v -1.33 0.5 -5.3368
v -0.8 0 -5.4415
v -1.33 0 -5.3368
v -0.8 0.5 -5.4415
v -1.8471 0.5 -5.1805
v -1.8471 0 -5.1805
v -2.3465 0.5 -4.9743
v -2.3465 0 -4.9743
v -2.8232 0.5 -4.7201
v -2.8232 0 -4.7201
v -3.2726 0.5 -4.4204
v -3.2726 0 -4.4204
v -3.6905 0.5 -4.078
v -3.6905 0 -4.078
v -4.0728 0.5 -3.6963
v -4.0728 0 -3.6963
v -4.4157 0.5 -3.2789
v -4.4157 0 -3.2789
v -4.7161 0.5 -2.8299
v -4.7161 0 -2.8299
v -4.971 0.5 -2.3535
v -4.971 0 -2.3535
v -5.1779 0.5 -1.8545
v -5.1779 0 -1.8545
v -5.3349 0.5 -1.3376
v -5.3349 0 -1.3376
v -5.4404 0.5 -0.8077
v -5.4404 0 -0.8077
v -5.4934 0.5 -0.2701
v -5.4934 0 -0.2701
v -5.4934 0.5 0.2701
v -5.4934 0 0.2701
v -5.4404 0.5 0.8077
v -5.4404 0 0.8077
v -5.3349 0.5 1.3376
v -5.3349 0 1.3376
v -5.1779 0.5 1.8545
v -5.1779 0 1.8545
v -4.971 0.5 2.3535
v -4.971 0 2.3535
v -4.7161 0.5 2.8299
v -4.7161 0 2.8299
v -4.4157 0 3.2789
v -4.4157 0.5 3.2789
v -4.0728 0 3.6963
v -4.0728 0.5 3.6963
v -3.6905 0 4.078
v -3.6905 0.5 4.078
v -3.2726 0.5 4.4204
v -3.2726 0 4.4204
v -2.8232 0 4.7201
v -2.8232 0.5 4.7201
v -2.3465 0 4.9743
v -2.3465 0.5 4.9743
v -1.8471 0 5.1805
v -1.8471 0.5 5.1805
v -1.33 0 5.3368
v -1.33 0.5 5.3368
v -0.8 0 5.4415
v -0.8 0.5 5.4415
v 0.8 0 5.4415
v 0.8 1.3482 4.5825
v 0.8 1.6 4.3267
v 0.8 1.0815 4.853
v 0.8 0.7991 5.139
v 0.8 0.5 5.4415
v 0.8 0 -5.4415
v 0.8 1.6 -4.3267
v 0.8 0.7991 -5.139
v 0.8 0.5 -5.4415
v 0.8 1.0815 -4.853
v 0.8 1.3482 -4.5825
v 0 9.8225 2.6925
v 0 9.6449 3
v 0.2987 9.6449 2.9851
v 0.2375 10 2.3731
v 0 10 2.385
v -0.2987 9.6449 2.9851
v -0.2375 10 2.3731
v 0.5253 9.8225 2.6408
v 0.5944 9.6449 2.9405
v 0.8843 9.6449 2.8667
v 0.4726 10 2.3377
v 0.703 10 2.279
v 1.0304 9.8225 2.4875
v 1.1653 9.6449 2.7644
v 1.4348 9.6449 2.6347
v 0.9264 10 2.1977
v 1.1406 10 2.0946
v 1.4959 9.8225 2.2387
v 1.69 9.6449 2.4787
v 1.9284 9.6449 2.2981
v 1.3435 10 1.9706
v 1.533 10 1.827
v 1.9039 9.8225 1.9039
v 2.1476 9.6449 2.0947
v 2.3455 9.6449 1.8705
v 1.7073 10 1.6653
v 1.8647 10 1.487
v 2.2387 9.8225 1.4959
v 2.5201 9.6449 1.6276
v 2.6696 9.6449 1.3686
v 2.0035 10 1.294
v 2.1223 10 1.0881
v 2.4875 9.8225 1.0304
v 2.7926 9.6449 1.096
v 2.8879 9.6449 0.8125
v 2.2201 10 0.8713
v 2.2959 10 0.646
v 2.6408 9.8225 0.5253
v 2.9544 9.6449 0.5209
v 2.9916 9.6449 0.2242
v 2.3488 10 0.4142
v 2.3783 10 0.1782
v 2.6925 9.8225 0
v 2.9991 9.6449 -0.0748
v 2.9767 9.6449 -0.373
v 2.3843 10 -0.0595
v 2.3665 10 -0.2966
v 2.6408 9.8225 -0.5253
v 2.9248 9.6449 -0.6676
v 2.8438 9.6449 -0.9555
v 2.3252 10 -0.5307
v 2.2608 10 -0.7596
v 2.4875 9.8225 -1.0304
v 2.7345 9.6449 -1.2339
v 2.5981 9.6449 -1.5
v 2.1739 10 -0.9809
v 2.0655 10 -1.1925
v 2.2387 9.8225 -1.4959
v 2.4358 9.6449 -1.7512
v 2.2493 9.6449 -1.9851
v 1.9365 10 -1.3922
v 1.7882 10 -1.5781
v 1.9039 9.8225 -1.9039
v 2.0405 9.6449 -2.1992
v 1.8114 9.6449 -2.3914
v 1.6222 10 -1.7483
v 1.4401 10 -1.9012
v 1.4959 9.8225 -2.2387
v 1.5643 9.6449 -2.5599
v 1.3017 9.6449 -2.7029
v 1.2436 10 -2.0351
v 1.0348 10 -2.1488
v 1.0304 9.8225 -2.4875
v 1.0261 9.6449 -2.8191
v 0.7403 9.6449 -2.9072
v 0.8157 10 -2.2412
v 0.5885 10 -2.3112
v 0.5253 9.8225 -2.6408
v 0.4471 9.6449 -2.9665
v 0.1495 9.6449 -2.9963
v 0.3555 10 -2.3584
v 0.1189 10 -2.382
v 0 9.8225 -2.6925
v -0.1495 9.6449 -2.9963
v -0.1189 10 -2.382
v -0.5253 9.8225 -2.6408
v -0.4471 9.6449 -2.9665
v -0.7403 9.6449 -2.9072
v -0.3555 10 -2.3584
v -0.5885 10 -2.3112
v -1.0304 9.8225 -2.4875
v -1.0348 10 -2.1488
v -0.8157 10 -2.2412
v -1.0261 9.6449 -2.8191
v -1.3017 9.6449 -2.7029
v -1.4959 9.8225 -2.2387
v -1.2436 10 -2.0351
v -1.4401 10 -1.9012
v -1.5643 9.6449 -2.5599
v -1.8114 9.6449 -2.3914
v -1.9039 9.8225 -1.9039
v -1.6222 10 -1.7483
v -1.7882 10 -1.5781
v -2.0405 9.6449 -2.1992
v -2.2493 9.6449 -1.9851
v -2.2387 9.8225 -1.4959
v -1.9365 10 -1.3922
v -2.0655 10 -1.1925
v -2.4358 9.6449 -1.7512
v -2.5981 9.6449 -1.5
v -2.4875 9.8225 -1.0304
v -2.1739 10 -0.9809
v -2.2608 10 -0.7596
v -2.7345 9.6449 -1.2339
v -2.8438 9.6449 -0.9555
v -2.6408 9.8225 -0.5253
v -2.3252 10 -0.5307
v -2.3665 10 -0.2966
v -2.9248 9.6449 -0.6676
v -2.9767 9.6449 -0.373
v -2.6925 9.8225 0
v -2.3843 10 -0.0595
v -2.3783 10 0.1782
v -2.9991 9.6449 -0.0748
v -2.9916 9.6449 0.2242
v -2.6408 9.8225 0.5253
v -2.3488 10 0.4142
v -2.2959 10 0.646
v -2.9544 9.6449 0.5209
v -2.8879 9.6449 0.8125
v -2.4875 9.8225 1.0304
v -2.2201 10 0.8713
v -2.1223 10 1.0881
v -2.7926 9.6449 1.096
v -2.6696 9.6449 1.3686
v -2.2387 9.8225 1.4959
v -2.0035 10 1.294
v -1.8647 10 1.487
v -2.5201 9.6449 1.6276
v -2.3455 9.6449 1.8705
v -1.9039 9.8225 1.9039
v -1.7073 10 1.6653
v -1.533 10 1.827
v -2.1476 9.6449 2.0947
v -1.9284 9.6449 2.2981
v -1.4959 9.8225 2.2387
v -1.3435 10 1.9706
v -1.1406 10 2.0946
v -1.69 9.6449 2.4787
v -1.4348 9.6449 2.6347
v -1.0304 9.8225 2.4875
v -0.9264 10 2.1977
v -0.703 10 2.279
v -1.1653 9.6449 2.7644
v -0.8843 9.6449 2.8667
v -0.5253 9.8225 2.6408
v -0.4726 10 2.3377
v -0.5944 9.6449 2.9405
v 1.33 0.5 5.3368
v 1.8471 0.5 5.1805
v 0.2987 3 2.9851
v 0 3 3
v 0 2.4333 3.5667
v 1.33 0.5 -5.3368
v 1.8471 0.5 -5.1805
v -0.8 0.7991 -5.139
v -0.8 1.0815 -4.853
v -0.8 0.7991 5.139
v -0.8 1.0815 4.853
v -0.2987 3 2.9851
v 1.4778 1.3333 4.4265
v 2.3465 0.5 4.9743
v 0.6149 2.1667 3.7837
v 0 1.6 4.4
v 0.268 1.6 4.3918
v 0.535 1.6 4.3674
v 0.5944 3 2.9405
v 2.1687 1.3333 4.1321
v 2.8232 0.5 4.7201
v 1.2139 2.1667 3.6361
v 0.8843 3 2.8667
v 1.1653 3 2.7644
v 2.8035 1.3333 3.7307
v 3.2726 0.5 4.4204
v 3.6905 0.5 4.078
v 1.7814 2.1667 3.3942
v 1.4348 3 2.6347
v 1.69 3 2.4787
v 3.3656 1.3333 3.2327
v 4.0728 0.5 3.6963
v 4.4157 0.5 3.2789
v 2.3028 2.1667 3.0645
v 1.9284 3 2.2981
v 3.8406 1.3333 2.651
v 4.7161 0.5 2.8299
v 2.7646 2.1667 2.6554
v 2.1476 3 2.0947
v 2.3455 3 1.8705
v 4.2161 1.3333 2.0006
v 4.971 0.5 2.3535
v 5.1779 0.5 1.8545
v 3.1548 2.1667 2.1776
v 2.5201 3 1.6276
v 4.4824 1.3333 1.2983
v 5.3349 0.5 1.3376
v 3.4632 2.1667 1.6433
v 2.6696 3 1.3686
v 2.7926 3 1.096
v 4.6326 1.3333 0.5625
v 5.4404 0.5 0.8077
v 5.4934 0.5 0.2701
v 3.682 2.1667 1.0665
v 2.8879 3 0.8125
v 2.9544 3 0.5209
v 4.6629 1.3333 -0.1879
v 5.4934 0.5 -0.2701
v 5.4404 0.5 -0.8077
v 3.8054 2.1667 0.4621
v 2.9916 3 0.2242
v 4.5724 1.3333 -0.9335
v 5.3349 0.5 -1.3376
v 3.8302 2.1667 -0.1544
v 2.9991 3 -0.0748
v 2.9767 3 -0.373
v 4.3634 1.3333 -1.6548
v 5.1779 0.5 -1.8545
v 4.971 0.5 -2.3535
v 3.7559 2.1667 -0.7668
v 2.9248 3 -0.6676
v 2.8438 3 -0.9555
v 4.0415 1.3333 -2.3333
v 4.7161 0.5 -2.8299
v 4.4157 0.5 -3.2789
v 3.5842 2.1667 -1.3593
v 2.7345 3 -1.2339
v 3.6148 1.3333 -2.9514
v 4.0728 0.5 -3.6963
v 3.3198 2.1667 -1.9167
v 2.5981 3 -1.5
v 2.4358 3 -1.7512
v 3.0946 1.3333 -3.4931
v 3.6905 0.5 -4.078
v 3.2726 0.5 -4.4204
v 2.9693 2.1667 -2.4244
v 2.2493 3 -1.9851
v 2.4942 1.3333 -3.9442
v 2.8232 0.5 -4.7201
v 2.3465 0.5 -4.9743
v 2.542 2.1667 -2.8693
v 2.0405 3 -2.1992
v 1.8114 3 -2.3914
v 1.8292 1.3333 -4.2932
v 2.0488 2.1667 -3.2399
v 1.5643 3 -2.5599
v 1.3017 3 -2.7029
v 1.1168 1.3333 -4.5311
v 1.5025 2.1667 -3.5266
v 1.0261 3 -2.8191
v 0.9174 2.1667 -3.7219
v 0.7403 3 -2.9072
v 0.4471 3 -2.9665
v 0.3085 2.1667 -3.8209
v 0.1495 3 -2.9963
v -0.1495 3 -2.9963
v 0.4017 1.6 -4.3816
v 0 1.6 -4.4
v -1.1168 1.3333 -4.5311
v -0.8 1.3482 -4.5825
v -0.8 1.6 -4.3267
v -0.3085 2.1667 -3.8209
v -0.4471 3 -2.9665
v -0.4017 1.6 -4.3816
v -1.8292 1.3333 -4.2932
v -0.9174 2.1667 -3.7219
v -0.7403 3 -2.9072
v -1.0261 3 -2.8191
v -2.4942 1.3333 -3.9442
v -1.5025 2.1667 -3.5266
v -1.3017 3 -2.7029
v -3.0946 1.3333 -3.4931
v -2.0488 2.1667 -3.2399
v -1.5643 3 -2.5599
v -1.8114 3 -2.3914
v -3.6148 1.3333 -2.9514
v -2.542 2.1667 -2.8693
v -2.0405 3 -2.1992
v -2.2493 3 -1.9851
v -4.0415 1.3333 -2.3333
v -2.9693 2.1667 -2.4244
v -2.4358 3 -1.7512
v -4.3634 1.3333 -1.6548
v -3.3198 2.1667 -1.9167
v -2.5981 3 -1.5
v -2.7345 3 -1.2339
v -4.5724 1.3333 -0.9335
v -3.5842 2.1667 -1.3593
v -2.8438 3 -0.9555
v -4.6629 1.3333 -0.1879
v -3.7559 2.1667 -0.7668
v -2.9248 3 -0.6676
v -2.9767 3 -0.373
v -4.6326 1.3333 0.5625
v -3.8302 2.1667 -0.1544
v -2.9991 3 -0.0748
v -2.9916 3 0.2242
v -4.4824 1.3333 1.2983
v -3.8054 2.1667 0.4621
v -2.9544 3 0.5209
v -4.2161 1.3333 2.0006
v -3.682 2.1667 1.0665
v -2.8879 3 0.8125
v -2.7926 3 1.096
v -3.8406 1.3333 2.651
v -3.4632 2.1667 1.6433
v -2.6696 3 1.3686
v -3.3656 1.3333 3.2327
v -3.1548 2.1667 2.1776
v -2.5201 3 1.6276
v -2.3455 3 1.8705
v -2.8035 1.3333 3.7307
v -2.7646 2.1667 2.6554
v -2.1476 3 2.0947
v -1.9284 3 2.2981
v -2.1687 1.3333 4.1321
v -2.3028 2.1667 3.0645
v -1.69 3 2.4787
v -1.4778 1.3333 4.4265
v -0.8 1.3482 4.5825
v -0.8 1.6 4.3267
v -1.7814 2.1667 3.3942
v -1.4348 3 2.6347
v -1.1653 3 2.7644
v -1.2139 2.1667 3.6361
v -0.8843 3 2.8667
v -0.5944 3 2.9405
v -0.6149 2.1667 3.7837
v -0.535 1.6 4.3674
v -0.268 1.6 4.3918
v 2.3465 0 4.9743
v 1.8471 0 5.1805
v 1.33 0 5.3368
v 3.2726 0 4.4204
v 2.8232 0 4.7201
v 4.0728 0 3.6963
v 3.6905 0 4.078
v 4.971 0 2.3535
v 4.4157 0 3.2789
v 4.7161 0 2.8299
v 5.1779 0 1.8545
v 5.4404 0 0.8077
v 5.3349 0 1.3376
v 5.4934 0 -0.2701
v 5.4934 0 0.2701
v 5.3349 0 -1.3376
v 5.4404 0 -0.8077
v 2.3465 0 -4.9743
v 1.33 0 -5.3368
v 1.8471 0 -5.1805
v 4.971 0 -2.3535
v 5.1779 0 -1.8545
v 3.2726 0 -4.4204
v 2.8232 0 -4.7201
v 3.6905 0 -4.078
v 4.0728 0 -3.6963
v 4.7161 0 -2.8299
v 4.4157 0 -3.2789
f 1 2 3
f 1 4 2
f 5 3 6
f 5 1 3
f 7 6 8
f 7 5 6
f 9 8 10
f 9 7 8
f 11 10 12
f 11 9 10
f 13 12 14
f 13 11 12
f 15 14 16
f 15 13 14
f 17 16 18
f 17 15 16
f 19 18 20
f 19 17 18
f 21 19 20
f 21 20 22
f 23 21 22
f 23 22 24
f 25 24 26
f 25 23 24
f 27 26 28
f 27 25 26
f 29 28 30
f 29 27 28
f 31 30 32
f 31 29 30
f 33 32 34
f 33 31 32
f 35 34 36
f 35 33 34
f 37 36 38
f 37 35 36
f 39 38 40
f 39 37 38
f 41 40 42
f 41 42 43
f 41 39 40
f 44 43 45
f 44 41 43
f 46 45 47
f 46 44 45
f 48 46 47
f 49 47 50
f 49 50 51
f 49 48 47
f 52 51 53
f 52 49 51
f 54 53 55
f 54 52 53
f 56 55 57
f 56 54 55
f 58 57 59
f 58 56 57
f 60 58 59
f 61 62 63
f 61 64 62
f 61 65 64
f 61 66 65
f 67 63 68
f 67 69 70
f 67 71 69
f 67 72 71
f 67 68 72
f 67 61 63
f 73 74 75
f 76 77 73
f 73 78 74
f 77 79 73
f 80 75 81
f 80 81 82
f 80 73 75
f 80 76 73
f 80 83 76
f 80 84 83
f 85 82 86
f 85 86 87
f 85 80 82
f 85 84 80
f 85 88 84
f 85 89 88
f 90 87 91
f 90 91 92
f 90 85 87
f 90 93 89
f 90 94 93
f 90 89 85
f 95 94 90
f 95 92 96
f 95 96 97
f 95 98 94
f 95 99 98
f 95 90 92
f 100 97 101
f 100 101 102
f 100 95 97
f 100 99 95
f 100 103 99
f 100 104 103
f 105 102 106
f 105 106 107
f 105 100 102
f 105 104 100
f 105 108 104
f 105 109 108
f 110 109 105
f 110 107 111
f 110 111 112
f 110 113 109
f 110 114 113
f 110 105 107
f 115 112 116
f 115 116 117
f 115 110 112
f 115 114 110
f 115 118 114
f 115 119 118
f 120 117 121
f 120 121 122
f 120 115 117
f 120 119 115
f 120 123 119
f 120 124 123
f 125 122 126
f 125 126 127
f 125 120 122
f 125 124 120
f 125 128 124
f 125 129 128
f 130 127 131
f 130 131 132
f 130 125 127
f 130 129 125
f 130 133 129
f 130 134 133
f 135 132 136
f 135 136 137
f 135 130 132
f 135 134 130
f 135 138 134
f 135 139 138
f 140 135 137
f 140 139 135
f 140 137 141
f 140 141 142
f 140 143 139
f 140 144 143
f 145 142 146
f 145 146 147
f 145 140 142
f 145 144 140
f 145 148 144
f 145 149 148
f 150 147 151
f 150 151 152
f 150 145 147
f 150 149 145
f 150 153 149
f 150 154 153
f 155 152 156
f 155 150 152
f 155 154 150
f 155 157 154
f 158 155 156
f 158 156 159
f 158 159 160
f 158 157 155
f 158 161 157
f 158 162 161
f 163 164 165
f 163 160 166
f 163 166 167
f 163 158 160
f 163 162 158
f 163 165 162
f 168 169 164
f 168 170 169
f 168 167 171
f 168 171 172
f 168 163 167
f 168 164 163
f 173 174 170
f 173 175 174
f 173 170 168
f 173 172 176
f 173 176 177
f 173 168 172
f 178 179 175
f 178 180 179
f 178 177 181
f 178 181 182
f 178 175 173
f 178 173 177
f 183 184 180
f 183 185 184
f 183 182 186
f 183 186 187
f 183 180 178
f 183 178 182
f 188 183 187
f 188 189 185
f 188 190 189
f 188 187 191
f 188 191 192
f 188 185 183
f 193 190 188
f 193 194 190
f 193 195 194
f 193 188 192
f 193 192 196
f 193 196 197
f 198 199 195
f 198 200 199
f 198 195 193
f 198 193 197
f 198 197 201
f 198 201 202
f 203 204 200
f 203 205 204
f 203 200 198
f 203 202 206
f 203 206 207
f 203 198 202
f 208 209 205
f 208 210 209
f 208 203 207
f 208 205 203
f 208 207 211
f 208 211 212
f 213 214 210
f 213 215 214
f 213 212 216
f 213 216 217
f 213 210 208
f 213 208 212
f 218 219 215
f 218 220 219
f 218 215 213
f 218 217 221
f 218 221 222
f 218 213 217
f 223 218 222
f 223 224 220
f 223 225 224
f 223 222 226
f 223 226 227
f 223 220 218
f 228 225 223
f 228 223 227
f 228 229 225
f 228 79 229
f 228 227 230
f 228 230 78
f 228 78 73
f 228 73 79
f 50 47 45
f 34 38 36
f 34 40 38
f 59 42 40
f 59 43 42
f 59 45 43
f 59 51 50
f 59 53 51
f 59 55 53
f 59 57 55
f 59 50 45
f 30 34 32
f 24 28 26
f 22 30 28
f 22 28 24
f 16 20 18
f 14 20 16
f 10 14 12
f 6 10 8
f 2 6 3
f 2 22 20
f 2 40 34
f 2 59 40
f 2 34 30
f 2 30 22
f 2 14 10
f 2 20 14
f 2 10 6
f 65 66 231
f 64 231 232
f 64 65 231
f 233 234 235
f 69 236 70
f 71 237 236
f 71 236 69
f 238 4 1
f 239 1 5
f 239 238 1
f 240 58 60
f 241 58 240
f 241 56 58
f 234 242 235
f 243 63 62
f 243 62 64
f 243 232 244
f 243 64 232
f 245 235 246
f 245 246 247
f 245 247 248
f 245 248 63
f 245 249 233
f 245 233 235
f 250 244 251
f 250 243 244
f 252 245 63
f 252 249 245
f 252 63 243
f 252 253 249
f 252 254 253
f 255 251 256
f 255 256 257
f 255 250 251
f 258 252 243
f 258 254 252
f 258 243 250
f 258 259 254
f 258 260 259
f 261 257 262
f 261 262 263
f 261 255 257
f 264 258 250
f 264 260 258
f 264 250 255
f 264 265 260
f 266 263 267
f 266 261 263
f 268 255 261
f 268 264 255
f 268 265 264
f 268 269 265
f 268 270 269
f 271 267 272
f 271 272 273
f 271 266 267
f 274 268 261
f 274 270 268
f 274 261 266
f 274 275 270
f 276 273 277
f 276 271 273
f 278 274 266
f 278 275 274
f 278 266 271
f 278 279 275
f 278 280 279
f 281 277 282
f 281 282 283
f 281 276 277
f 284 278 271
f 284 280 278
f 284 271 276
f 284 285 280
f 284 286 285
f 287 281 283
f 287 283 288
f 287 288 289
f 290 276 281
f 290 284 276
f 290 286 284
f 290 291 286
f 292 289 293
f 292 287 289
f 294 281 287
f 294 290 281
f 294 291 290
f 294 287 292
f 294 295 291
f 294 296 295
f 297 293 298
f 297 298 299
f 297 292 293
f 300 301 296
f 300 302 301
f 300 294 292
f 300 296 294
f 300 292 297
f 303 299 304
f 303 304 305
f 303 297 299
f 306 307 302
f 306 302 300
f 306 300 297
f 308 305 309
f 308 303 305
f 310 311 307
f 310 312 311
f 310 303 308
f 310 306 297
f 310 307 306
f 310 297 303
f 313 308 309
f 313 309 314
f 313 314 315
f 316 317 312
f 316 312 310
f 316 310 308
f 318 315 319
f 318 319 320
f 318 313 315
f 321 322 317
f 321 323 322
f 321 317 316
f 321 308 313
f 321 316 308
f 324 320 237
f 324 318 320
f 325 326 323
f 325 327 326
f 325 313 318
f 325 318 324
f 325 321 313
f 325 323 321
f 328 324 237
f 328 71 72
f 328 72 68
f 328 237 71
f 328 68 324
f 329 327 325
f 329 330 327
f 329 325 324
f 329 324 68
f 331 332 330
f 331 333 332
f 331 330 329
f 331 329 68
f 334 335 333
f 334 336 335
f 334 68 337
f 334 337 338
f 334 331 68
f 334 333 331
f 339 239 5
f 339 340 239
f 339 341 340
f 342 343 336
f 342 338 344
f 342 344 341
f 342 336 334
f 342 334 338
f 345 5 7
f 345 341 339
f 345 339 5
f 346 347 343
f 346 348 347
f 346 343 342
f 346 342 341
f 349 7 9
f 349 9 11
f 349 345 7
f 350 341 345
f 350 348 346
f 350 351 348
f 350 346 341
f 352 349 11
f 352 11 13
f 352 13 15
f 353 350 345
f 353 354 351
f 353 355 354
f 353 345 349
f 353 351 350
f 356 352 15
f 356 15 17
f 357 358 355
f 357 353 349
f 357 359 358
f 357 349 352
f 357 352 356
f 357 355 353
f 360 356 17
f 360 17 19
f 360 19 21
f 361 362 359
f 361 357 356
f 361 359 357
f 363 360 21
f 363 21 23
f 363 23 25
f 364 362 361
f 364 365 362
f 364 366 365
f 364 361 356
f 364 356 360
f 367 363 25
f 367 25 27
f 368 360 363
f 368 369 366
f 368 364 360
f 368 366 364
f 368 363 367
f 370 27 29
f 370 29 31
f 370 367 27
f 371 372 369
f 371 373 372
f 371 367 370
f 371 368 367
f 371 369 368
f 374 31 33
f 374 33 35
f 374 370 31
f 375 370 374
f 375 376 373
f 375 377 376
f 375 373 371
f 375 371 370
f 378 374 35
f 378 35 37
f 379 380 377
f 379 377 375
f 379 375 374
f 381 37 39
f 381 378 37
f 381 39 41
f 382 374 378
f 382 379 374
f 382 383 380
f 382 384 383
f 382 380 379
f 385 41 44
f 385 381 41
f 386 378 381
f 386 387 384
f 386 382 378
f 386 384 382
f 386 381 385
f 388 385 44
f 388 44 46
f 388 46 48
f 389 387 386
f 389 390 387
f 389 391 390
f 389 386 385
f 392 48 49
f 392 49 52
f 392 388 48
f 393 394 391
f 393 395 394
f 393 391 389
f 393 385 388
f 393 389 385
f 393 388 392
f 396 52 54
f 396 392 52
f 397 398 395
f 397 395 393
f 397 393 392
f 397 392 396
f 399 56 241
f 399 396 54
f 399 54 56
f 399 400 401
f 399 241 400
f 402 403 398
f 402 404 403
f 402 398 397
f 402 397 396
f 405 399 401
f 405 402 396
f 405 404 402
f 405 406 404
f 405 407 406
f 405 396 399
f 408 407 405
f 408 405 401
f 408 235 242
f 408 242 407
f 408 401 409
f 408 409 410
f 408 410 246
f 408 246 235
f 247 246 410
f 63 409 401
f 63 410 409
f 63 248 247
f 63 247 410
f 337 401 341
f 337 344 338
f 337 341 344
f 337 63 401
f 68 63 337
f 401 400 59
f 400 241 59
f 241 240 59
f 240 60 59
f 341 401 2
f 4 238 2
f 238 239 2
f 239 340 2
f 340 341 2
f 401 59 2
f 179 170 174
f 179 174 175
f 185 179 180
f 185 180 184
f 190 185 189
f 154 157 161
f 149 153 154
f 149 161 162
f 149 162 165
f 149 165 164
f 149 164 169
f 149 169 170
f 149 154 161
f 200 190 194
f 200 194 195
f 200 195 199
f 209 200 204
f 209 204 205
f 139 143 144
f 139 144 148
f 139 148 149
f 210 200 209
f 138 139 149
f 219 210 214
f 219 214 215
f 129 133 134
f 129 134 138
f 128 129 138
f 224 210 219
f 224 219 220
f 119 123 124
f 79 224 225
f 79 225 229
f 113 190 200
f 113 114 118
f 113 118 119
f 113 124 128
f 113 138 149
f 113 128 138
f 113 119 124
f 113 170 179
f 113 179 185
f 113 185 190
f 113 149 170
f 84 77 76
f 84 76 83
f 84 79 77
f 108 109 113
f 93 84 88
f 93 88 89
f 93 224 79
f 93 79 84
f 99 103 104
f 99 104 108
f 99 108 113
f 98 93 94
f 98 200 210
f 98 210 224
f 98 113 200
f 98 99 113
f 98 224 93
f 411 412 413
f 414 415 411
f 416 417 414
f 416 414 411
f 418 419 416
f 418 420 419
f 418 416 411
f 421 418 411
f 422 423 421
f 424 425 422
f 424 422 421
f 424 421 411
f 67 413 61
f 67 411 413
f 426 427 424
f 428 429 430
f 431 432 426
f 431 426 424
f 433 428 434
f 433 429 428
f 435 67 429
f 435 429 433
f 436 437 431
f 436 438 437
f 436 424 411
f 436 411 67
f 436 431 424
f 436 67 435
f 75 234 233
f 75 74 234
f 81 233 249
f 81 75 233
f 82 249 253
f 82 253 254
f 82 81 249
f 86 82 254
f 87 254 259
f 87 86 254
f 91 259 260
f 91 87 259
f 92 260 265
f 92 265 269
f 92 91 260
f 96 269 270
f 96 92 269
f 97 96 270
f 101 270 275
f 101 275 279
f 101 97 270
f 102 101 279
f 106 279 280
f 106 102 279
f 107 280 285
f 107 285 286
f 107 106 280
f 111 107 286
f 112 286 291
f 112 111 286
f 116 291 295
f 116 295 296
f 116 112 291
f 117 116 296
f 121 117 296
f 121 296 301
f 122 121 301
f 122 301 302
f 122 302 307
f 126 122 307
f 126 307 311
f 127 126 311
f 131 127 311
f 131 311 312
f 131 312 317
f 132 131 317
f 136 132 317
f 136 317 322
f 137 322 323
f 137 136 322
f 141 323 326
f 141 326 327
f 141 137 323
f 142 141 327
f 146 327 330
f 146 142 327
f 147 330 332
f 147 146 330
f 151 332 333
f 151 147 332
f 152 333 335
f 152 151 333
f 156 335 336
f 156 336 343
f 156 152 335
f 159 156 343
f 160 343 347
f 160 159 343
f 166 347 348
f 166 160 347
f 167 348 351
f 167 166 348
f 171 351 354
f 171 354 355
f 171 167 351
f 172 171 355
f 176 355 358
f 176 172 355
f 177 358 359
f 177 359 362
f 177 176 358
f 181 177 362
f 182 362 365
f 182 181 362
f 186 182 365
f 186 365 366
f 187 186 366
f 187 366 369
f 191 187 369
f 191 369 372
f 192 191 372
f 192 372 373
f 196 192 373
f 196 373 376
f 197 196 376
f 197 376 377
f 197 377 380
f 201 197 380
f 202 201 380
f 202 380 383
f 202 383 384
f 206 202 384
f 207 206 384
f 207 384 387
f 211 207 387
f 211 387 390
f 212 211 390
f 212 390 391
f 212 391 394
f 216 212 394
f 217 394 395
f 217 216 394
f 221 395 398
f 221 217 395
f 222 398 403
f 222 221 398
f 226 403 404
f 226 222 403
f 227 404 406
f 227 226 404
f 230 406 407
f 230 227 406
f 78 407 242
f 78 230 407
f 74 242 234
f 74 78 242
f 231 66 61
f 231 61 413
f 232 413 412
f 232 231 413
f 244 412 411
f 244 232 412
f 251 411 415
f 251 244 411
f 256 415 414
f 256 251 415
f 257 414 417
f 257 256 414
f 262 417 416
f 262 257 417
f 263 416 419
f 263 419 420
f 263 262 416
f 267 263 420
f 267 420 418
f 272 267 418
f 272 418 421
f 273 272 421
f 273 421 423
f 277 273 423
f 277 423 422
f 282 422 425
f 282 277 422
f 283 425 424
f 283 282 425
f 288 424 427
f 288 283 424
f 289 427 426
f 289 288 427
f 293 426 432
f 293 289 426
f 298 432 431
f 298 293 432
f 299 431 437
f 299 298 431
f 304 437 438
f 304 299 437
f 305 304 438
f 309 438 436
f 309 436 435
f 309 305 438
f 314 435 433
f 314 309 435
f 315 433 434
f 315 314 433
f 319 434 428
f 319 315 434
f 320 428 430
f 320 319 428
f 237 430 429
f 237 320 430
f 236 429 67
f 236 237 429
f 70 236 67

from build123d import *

# Parameters (mm, degrees)
SKETCH001_W  = 11
SKETCH001_H  = 1.6
POCKET_DEPTH = 1.6


with BuildPart() as part:
    # Sketch → Revolution (revolve)
    with BuildSketch(Plane.YZ):
        Polygon((0, 0), (0, 5.5), (0.5, 5.5), (3, 3), (9.64493, 3), (10, 2.385), (10, 0), align=None)
    revolve(axis=Axis((0, 0, 0), (0, 1, 0)))

    # Sketch001 → Pocket (cut)
    with BuildSketch(Plane(origin=(0, 0, 0), x_dir=(0, 0, -1), z_dir=(0, -1, 0))):
        Rectangle(SKETCH001_W, SKETCH001_H)
    extrude(amount=-POCKET_DEPTH, mode=Mode.SUBTRACT)


solid = part.part
